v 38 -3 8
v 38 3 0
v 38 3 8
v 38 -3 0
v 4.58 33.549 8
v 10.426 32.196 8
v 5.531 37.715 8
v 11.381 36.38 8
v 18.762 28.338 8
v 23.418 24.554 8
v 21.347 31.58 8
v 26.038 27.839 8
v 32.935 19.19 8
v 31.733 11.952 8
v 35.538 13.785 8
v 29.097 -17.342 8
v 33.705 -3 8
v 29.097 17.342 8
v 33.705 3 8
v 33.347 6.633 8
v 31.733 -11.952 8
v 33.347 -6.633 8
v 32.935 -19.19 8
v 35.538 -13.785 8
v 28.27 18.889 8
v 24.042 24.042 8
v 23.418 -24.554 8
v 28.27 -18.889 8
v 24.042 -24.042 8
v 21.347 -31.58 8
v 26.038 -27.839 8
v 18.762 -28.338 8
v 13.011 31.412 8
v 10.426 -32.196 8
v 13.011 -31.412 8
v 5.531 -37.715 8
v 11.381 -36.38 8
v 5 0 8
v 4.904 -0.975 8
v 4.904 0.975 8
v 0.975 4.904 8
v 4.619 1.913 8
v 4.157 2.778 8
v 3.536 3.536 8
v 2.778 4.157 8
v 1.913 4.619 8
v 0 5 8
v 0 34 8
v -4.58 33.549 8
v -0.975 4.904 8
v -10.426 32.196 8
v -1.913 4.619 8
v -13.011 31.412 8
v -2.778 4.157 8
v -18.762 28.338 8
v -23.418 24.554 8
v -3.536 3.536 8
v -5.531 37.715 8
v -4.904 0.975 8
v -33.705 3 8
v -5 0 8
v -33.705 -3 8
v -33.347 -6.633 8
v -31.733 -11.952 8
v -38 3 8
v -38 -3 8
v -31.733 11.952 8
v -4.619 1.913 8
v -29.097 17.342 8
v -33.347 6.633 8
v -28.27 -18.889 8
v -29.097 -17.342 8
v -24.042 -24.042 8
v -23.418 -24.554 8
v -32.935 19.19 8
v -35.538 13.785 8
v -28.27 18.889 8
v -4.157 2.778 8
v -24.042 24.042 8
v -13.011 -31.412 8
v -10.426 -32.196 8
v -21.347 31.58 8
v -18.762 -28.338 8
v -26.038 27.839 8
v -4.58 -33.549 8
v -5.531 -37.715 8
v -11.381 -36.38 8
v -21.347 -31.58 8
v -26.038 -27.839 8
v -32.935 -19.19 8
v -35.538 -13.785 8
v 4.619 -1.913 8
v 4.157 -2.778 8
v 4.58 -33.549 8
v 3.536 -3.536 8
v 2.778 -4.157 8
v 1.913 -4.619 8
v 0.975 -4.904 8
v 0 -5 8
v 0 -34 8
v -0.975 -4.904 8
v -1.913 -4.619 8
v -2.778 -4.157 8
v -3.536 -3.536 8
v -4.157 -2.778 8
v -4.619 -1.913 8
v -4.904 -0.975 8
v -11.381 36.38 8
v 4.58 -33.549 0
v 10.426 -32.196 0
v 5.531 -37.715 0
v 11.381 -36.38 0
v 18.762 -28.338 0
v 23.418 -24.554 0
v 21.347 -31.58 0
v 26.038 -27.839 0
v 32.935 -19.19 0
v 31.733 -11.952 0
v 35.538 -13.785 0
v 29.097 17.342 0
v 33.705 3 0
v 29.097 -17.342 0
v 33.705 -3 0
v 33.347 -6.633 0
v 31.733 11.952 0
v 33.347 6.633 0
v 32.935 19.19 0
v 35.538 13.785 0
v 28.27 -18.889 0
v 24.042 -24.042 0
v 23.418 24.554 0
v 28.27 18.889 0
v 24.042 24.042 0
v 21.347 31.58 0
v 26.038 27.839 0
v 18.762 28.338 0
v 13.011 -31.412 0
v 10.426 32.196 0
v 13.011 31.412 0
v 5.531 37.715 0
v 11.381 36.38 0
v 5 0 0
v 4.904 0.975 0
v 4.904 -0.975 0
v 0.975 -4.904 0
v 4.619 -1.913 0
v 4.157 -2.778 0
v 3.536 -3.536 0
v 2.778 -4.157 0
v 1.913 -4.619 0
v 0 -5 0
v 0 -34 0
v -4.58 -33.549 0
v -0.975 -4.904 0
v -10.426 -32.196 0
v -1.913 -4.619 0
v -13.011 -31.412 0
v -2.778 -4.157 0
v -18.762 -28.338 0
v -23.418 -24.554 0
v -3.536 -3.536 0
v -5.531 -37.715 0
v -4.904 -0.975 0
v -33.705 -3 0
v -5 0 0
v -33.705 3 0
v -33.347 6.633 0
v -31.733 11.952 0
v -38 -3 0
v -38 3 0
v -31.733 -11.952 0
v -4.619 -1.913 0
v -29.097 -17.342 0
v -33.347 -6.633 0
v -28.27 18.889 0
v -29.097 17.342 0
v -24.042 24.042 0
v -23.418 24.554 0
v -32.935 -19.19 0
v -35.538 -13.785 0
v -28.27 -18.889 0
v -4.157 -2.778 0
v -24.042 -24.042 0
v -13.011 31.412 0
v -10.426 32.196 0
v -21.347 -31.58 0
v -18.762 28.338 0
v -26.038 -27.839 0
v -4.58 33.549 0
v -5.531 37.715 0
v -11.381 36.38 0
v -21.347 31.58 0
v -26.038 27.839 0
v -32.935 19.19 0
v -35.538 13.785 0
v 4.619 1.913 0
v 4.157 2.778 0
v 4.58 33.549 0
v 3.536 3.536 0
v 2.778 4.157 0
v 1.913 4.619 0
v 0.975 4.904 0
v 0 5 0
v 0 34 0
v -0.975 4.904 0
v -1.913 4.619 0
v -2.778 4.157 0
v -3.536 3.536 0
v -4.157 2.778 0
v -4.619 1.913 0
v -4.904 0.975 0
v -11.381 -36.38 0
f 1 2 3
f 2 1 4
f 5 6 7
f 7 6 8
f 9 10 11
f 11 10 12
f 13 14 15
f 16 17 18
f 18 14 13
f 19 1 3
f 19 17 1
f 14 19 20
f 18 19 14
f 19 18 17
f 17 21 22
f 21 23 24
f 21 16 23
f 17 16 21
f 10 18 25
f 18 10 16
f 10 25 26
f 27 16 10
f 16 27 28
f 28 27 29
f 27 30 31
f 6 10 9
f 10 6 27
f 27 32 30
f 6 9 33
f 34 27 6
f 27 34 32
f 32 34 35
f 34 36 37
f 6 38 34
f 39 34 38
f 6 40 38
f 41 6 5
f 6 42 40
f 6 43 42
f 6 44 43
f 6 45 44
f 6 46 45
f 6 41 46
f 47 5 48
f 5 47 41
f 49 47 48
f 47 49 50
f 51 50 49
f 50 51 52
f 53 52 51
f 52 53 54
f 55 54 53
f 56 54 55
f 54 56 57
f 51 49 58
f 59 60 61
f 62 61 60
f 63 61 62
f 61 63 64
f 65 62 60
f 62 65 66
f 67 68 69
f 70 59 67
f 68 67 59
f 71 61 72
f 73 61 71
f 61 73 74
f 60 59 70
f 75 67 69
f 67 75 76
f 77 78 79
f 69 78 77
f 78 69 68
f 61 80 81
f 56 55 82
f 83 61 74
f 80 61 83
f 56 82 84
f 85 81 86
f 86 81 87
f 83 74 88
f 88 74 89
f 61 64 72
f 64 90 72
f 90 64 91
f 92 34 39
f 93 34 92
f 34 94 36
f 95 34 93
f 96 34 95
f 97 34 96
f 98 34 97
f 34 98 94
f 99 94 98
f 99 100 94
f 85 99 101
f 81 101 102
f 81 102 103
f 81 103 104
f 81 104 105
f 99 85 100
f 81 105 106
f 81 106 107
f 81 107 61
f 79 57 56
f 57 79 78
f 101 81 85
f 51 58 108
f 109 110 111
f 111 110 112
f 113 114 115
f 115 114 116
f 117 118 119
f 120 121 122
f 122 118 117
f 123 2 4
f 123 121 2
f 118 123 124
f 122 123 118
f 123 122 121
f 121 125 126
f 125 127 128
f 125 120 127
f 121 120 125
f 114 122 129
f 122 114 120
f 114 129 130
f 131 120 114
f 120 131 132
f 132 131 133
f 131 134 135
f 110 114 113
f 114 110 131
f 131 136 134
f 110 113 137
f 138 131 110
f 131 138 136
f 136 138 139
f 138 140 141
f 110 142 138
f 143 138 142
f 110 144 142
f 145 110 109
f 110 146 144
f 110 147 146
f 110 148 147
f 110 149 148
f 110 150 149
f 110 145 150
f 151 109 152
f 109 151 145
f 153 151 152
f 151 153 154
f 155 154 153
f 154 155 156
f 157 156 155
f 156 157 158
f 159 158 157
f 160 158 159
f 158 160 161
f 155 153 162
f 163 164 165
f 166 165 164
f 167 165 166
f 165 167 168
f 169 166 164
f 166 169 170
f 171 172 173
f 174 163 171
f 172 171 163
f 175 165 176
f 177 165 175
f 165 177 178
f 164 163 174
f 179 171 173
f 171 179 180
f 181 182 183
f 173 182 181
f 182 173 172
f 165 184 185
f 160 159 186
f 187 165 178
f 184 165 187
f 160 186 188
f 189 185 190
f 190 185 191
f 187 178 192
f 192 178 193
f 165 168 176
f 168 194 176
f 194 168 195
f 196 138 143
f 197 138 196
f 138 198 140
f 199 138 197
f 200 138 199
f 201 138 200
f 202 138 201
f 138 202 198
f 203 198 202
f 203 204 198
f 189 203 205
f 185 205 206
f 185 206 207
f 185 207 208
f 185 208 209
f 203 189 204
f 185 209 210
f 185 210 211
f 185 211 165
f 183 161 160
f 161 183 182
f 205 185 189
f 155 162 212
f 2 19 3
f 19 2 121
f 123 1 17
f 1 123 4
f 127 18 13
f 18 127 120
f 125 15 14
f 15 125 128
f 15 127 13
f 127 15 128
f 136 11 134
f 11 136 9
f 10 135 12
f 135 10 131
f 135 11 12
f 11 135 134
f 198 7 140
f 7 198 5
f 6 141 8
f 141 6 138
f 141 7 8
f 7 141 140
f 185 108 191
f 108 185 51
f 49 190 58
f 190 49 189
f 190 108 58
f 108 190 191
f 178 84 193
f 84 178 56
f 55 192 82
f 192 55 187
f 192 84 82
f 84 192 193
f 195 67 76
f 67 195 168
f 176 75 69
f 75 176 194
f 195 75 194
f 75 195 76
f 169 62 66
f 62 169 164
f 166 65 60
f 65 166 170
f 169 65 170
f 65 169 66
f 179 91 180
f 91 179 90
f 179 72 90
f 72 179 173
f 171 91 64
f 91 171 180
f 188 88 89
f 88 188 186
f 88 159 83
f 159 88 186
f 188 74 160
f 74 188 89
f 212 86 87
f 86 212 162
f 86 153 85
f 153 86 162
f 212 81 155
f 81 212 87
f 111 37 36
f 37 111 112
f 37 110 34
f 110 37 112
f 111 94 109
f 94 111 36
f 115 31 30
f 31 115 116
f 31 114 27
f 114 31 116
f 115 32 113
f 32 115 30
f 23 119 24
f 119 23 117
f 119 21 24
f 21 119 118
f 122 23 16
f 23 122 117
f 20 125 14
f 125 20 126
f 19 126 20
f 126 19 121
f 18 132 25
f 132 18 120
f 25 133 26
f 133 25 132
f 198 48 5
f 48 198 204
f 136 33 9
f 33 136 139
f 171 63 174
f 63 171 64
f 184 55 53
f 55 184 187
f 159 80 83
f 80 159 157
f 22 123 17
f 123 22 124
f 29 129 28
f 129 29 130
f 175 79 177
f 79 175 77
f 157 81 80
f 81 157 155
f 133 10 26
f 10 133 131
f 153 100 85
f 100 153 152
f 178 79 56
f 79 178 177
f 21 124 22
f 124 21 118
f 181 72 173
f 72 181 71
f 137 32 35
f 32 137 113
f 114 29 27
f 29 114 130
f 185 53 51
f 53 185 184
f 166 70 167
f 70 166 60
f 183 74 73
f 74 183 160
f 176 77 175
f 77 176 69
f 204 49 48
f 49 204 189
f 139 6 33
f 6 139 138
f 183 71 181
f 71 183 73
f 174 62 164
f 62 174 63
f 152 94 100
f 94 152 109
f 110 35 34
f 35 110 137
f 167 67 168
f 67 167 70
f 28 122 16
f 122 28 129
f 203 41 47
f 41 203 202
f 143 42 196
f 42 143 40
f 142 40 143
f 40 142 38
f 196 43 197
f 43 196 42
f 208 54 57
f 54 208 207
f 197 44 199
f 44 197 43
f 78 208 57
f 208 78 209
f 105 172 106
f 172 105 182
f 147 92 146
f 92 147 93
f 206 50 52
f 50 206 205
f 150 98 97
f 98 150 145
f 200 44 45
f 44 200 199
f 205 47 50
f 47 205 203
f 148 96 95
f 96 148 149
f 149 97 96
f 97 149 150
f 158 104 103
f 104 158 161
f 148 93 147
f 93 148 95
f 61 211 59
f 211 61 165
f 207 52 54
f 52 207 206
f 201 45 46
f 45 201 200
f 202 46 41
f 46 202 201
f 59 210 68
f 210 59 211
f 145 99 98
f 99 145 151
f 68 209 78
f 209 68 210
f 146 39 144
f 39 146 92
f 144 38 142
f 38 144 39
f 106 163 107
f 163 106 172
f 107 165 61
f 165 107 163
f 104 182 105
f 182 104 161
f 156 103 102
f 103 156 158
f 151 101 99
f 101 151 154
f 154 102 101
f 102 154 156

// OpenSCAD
$fn = 32;

// ----------------------------------------------------------------------
// Spur blank: bored gear blank
// ----------------------------------------------------------------------

// --- parameters (mm) ---
disc_r = 34;              // blank root radius
disc_t = 8;               // blank thickness
n_teeth = 14;             // stub tooth count
tooth_w = 6;              // tooth width at the root
tooth_h = 4;              // tooth height above the root
bore_r = 5;               // central bore radius

out_r = disc_r + tooth_h;  // tip radius
bbox_x = 76.0;  // measured width over the teeth
bbox_y = 75.43;  // measured depth over the teeth

difference() {
union() {
  cylinder(r = disc_r, h = disc_t);
  for (i = [0 : n_teeth - 1])
    rotate([0, 0, i * 360 / n_teeth])
      translate([disc_r - 1, -tooth_w / 2, 0])
        cube([tooth_h + 1, tooth_w, disc_t]);
}
  translate([0, 0, -1]) cylinder(r = bore_r, h = disc_t + 2);
}
